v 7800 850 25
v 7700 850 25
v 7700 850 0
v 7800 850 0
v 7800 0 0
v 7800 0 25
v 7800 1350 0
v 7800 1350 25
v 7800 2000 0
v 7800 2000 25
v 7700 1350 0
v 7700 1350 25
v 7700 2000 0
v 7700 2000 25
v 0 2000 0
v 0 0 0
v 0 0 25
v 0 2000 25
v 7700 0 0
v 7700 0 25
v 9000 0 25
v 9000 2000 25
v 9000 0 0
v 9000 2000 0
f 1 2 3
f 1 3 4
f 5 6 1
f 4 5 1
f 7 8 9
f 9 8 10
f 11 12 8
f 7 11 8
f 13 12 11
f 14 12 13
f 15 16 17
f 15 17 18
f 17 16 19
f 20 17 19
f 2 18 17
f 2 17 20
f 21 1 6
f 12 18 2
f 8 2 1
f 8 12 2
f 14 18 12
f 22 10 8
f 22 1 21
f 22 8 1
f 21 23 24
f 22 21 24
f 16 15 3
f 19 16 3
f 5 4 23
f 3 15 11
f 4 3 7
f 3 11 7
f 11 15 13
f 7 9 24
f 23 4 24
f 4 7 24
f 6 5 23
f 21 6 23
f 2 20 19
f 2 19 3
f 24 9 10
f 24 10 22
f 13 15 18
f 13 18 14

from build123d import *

# Parameters (mm, degrees)
F0_W     = 9000
F0_H     = 2000
F1_DEPTH = 25
F2_W     = 100
F2_H     = 650
F2_H_2   = 850
F3_DEPTH = 25.001


with BuildPart() as f1:
    # F0 (on Top) → F1 (new body)
    with BuildSketch(Plane.XY):
        with Locations((4500, 1000)):
            Rectangle(F0_W, F0_H)
    extrude(amount=F1_DEPTH)

    # F2 (on face) → F3 (cut, through all)
    with BuildSketch(Plane.XY.offset(25)):
        with Locations((7750, 1675)):
            Rectangle(F2_W, F2_H)
        with Locations((7750, 425)):
            Rectangle(F2_W, F2_H_2)
    extrude(amount=-F3_DEPTH, mode=Mode.SUBTRACT)


solid = f1.part
